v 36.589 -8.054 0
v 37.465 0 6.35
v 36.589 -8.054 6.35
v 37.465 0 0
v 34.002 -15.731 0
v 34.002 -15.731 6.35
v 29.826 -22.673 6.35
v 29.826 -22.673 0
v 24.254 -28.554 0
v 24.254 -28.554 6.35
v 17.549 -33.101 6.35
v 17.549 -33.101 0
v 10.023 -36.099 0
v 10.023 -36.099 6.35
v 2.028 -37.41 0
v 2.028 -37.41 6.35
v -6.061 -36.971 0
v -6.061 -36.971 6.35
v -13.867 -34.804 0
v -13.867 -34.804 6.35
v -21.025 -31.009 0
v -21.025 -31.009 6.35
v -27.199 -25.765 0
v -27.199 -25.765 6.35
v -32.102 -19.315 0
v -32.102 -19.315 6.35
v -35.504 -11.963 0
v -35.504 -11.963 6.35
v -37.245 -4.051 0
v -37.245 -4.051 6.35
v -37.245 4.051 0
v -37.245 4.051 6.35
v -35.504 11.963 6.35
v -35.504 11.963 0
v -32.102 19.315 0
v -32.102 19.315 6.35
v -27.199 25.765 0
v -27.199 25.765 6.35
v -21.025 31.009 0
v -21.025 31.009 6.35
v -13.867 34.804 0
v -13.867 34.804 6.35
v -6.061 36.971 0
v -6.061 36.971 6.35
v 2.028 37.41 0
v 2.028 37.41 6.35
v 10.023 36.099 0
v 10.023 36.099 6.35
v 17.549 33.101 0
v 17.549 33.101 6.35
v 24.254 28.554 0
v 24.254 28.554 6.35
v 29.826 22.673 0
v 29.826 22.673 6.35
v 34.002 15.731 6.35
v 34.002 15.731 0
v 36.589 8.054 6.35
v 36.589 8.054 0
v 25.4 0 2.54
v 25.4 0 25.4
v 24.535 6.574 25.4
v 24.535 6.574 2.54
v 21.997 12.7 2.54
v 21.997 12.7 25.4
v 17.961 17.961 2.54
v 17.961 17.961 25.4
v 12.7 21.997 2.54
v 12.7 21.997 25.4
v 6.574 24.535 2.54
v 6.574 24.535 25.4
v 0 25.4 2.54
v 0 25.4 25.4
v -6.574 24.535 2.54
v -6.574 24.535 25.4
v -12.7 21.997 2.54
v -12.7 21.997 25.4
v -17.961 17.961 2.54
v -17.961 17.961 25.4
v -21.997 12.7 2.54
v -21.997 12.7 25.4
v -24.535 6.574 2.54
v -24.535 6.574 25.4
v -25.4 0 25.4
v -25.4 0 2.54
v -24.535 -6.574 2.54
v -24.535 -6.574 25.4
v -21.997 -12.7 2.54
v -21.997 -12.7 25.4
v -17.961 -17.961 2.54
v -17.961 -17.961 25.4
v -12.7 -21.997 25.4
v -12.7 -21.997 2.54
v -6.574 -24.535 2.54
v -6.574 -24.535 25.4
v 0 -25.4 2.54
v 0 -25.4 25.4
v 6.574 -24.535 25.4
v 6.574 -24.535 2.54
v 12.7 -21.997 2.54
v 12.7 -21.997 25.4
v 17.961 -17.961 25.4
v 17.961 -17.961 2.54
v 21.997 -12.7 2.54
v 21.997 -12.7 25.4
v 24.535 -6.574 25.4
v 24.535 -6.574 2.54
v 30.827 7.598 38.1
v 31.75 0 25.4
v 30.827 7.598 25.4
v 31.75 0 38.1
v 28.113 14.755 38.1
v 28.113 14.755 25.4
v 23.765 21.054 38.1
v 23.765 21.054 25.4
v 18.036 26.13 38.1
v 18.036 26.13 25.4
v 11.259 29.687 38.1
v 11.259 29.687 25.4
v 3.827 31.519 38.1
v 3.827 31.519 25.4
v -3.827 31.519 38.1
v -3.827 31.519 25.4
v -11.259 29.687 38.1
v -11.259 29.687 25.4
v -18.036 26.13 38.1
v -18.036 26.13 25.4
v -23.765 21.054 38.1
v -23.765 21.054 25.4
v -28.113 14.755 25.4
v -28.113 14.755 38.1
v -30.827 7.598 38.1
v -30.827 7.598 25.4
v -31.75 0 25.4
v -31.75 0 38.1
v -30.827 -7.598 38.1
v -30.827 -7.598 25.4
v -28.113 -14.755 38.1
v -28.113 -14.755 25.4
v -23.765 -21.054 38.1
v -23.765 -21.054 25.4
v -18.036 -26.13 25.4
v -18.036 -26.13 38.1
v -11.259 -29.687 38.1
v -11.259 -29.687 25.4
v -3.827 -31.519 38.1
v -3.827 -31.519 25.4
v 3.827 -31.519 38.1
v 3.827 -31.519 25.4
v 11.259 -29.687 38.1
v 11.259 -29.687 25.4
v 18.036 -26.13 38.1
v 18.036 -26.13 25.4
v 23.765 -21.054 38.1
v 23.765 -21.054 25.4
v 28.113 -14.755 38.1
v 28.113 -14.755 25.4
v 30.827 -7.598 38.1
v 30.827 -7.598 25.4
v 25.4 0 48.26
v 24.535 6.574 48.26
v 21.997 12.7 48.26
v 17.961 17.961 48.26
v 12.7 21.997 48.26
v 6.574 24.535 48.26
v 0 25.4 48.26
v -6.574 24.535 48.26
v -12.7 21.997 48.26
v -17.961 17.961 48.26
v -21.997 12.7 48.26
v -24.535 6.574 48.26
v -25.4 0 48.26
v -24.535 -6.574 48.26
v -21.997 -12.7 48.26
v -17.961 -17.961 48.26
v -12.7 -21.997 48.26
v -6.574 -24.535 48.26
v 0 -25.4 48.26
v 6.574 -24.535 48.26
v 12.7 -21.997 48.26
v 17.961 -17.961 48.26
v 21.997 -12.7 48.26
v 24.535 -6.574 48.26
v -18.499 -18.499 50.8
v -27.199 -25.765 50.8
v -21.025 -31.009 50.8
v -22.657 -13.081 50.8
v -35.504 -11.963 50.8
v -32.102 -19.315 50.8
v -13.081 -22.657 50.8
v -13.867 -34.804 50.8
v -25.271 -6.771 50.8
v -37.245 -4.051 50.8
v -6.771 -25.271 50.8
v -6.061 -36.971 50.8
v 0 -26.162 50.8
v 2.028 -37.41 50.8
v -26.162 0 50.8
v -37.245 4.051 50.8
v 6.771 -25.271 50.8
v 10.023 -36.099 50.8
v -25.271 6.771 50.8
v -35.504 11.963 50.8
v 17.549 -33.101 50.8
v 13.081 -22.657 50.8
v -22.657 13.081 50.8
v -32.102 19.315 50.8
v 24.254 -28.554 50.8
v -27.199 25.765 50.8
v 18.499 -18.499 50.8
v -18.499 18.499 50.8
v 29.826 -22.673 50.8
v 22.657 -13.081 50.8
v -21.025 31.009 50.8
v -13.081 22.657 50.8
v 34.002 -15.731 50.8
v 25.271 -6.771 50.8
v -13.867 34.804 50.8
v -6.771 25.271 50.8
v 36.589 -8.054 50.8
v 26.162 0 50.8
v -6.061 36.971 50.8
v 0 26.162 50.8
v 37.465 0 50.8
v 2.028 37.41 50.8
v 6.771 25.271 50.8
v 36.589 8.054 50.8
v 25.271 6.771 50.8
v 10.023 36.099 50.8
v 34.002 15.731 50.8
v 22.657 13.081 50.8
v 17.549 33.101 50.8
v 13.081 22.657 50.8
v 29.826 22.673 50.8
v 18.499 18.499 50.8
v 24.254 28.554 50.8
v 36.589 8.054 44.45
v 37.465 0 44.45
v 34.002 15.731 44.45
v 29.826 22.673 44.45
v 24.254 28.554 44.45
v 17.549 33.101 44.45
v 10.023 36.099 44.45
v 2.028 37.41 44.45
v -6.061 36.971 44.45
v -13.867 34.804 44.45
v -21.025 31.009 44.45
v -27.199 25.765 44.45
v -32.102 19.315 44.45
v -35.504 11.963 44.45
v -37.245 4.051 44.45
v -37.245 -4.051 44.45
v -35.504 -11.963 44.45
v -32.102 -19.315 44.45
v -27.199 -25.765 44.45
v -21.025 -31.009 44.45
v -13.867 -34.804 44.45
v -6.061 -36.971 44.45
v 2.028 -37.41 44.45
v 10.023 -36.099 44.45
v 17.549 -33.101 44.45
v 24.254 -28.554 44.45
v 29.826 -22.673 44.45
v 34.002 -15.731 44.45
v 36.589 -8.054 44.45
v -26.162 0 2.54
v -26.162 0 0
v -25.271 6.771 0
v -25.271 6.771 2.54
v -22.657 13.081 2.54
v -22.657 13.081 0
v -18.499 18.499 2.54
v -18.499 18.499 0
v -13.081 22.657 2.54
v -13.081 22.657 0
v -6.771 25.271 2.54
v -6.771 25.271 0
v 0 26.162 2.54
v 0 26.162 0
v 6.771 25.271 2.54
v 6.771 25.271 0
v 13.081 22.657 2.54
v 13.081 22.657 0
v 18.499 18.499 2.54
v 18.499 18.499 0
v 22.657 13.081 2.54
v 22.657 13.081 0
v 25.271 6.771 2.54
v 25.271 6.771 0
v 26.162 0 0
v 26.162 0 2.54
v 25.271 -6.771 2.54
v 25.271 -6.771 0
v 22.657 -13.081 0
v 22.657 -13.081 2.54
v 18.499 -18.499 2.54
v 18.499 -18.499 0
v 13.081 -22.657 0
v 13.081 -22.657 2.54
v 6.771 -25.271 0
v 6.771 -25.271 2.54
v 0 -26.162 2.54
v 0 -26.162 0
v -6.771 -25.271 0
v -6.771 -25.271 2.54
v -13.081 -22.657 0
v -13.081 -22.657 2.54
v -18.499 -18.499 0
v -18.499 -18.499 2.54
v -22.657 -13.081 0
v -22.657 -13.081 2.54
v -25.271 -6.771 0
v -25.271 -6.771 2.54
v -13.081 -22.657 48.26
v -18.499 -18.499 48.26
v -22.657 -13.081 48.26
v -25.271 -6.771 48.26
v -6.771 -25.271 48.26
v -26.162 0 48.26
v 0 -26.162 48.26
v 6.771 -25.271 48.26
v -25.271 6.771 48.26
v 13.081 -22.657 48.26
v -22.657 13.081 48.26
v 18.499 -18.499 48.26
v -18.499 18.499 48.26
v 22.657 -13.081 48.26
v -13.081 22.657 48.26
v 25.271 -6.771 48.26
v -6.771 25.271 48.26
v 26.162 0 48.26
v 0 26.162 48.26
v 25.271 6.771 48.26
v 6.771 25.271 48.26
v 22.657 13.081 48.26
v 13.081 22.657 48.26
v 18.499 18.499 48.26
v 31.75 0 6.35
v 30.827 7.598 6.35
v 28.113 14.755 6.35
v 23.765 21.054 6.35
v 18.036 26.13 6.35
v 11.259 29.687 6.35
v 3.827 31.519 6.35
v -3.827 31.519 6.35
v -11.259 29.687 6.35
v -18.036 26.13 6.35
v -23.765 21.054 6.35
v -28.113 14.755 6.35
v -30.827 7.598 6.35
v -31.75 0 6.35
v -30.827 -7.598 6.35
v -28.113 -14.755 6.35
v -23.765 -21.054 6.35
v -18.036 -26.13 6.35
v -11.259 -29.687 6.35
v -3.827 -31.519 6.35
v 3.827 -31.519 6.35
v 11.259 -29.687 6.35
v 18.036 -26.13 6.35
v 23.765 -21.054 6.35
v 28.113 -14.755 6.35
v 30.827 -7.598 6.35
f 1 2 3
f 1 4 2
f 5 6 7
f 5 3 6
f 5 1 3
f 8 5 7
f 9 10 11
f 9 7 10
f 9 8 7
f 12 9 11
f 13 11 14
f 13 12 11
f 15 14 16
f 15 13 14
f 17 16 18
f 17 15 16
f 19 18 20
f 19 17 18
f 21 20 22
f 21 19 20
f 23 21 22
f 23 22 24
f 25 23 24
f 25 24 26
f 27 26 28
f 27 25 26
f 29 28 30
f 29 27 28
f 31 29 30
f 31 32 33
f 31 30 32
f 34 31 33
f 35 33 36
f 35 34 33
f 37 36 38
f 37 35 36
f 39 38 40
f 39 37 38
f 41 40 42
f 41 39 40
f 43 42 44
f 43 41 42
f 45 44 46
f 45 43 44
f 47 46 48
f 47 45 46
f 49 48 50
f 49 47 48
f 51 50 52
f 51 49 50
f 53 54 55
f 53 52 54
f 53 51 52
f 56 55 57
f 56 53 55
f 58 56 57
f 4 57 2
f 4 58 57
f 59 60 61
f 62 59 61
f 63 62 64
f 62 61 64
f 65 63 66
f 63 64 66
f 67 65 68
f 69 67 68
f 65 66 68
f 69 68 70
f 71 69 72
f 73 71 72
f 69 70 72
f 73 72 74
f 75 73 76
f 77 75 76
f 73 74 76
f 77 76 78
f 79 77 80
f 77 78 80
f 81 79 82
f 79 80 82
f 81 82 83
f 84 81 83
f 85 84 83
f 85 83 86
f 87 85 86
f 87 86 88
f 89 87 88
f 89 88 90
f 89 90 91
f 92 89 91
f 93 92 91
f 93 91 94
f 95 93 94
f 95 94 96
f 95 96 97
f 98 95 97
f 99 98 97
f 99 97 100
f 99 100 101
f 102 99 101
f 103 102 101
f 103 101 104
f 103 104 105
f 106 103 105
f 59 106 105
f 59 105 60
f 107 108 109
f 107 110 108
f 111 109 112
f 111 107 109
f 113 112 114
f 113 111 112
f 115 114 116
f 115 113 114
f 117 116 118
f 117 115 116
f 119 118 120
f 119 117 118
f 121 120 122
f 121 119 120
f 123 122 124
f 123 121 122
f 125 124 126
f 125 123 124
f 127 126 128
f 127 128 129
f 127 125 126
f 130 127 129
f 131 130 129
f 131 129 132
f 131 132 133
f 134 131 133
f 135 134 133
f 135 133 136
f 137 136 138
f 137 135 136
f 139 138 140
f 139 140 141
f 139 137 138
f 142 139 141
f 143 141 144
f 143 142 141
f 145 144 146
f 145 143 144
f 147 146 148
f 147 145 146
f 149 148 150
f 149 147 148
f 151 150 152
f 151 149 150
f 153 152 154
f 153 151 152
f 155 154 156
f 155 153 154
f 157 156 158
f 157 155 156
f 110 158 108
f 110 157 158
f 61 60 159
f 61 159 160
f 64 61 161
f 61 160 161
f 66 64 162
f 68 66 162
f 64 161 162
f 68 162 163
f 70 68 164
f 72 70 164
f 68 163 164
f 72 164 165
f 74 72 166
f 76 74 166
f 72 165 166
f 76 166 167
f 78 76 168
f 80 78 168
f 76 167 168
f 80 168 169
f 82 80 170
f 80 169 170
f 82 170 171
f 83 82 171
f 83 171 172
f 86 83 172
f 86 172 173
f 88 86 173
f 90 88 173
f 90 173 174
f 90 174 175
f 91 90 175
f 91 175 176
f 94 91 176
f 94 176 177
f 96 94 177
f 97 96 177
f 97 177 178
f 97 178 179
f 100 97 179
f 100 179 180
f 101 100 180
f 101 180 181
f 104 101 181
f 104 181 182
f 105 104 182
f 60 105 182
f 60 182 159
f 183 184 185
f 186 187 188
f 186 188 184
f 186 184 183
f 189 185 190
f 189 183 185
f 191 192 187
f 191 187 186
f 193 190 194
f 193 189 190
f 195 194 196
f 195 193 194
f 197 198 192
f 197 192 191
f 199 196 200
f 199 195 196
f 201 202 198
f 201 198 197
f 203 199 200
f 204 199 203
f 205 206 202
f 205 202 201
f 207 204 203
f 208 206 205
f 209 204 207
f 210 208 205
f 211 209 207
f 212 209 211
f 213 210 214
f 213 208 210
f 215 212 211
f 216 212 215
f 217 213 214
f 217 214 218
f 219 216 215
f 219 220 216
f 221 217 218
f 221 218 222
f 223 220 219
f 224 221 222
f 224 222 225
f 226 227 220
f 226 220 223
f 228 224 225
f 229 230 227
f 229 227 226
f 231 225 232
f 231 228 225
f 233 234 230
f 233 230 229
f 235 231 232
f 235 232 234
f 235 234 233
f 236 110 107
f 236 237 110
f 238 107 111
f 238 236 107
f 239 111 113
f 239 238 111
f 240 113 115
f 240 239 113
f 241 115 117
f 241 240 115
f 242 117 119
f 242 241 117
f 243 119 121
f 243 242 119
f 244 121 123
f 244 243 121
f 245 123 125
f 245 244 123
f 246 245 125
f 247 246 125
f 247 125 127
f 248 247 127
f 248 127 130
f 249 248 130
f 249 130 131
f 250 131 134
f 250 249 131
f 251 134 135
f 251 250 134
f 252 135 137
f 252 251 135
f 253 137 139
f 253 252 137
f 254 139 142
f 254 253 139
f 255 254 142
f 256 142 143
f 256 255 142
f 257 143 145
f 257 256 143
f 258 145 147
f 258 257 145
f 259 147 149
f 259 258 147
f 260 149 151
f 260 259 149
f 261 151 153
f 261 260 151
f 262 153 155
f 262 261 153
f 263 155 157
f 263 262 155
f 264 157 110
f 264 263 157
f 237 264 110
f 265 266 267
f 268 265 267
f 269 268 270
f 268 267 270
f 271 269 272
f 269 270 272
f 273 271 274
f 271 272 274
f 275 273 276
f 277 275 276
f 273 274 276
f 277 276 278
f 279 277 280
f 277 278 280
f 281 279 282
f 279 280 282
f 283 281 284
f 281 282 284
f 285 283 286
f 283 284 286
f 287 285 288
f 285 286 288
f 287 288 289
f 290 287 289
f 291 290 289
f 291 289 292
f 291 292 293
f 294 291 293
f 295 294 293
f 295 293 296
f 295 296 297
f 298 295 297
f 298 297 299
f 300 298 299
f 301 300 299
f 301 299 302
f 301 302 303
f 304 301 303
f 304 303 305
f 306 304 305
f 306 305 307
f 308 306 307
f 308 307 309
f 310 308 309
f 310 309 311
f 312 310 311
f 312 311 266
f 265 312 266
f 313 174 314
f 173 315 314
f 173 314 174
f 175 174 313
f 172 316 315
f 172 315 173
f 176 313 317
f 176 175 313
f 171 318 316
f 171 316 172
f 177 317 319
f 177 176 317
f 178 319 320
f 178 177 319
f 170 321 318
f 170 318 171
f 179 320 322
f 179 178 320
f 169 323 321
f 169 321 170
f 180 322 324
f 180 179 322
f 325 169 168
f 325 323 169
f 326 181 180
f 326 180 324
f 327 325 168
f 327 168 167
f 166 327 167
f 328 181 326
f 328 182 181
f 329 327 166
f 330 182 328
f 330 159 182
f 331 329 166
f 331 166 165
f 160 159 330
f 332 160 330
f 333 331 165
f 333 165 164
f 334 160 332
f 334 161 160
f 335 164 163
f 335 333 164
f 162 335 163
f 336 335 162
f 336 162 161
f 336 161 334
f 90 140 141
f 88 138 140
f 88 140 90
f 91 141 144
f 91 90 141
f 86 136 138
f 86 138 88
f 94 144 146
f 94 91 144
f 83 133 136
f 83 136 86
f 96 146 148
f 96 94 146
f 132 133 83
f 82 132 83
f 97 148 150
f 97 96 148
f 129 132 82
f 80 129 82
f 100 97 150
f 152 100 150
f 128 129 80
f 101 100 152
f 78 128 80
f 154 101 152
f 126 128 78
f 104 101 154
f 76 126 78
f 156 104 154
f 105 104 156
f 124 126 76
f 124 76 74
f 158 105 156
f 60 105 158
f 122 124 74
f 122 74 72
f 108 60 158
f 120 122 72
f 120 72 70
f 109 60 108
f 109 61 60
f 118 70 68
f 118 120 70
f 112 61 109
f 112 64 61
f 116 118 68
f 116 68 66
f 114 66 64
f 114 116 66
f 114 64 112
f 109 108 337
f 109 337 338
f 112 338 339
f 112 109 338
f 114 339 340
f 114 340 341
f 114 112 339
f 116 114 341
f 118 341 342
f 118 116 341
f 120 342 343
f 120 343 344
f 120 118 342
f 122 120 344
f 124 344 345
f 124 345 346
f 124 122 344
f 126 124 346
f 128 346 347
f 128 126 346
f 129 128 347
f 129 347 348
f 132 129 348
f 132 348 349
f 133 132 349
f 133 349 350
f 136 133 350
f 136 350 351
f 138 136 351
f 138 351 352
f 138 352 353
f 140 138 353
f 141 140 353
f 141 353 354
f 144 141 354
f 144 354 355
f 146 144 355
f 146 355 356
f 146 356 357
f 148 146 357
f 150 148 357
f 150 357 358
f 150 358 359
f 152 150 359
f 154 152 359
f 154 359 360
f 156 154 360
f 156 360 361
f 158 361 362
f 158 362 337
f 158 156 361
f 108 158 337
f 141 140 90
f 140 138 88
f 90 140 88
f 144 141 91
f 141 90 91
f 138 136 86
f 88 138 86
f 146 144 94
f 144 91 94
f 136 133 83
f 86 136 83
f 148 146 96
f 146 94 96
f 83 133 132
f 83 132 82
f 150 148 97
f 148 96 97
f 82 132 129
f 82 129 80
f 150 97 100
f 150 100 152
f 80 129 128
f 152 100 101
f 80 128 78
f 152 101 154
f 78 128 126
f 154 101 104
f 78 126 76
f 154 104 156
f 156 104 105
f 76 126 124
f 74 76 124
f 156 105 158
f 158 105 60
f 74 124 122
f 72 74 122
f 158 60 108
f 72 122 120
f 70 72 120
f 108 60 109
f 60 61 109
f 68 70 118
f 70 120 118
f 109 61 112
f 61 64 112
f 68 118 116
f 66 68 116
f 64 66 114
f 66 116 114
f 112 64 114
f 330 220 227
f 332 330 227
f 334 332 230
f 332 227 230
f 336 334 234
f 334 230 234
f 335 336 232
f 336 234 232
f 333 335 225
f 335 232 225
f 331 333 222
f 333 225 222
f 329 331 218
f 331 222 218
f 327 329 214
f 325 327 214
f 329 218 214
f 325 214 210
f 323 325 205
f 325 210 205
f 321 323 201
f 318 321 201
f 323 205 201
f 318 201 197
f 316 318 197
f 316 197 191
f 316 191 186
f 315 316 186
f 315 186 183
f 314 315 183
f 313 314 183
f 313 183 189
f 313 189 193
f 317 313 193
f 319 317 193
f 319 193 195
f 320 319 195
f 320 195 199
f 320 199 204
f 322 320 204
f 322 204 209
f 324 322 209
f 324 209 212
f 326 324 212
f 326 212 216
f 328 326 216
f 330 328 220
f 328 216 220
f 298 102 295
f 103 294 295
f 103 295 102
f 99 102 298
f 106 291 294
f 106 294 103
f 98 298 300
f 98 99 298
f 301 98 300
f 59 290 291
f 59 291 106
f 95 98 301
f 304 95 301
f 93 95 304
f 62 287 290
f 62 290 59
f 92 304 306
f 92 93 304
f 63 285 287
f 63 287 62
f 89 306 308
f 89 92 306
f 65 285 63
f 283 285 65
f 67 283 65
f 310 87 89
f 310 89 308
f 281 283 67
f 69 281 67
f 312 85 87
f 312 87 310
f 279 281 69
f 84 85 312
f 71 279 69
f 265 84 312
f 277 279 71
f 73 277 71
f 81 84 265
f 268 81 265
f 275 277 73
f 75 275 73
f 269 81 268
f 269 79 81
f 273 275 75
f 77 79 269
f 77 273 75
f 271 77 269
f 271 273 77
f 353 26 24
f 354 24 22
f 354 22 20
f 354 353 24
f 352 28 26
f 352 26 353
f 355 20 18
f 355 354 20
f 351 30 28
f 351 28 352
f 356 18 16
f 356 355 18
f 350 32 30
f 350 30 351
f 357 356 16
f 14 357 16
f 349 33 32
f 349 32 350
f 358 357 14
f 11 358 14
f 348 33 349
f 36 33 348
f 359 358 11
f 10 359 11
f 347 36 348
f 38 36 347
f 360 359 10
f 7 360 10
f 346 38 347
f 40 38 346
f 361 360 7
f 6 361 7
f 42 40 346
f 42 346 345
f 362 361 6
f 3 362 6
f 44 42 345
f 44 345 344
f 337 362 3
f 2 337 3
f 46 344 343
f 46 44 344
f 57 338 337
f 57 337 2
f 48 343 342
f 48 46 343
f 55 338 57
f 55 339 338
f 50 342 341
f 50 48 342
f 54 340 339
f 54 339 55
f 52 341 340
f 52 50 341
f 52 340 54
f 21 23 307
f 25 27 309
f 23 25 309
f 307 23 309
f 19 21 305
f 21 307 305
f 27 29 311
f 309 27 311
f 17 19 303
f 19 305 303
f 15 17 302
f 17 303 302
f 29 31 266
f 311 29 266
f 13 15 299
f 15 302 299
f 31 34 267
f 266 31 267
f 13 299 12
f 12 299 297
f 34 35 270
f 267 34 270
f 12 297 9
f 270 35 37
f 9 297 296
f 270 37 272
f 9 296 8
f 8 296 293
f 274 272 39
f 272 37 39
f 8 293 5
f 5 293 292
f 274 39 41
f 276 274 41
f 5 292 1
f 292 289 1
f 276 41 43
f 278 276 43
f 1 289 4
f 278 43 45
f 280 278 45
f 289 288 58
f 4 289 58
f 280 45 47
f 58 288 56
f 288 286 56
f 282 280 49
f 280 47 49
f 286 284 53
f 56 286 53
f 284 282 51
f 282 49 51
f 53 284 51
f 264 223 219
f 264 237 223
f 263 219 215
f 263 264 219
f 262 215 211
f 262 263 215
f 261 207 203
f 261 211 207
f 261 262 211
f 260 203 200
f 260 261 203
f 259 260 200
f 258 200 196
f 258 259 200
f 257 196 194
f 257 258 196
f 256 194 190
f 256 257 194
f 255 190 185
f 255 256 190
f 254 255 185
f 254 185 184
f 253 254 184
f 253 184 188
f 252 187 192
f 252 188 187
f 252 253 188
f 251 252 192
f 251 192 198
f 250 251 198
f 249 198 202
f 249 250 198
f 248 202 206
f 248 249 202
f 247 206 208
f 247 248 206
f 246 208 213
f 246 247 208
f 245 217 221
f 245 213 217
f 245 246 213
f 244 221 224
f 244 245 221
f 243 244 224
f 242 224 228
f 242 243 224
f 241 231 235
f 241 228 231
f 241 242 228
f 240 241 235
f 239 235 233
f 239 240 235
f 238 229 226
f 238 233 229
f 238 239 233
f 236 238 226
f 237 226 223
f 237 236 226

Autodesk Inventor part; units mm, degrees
ref_plane "YZ Plane" through (0, 0, 0) normal (1, 0, 0) x (0, 1, 0)
ref_plane "XZ Plane" through (0, 0, 0) normal (0, 1, 0) x (-1, 0, 0)
sketch "Sketch1" plane through (0, 0, 0) normal (0, 0, 1) x (1, 0, 0)
  circle A0 centre (0, 0) radius 37.465
  dimension "d0" = 74.93
extrude "Extrusion1" add sketch "Sketch1" along normal blind 50.8
sketch "Sketch3" plane through (0, 0, 50.8) normal (0, 0, 1) x (1, 0, 0)
  circle A0 centre (0, 0) radius 26.162
  dimension "d6" = 52.324
extrude "Extrusion3" cut sketch "Sketch3" against normal blind 2.54
sketch "Sketch4" plane through (0, 0, 0) normal (0, 0, -1) x (-1, 0, 0)
  circle A0 centre (0, 0) radius 26.162
  dimension "d9" = 52.324
extrude "Extrusion4" cut sketch "Sketch4" against normal blind 2.54
ref_plane "Work Plane1" through (0, 0, 25.4) normal (0, 0, 1) x (1, 0, 0)
sketch "Sketch5" plane through (0, 0, 25.4) normal (0, 0, 1) x (1, 0, 0)
  circle A0 centre (0, 0) radius 31.75
  circle A1 centre (0, 0) radius 37.465
  dimension "d13" = 63.5
extrude "Extrusion5" cut sketch "Sketch5" along normal mid plane 38.1
ref_plane "Work Plane2" through (0, 0, 38.1) normal (0, 0, 1) x (1, 0, 0)
sketch "Sketch6" plane through (0, 0, 38.1) normal (0, 0, 1) x (1, 0, 0)
  circle A0 centre (0, 0) radius 31.75
  dimension "d17" = 63.5
loft "Loft1" add profiles "Sketch6" section 1 edges at (-37.465, 0, 44.45)
sketch "Sketch2" plane through (0, 0, 50.8) normal (0, 0, 1) x (1, 0, 0)
  circle A0 centre (0, 0) radius 25.4
  dimension "d3" = 50.8
extrude "Extrusion2" cut sketch "Sketch2" against normal blind 50.8
split body "Split1" result two bodies by plane through (0, 0, 25.4) normal (0, 0, 1) first body at (25.5646, -4.1547, 33.02)
properties part number "KF50tube_v1_s1"
